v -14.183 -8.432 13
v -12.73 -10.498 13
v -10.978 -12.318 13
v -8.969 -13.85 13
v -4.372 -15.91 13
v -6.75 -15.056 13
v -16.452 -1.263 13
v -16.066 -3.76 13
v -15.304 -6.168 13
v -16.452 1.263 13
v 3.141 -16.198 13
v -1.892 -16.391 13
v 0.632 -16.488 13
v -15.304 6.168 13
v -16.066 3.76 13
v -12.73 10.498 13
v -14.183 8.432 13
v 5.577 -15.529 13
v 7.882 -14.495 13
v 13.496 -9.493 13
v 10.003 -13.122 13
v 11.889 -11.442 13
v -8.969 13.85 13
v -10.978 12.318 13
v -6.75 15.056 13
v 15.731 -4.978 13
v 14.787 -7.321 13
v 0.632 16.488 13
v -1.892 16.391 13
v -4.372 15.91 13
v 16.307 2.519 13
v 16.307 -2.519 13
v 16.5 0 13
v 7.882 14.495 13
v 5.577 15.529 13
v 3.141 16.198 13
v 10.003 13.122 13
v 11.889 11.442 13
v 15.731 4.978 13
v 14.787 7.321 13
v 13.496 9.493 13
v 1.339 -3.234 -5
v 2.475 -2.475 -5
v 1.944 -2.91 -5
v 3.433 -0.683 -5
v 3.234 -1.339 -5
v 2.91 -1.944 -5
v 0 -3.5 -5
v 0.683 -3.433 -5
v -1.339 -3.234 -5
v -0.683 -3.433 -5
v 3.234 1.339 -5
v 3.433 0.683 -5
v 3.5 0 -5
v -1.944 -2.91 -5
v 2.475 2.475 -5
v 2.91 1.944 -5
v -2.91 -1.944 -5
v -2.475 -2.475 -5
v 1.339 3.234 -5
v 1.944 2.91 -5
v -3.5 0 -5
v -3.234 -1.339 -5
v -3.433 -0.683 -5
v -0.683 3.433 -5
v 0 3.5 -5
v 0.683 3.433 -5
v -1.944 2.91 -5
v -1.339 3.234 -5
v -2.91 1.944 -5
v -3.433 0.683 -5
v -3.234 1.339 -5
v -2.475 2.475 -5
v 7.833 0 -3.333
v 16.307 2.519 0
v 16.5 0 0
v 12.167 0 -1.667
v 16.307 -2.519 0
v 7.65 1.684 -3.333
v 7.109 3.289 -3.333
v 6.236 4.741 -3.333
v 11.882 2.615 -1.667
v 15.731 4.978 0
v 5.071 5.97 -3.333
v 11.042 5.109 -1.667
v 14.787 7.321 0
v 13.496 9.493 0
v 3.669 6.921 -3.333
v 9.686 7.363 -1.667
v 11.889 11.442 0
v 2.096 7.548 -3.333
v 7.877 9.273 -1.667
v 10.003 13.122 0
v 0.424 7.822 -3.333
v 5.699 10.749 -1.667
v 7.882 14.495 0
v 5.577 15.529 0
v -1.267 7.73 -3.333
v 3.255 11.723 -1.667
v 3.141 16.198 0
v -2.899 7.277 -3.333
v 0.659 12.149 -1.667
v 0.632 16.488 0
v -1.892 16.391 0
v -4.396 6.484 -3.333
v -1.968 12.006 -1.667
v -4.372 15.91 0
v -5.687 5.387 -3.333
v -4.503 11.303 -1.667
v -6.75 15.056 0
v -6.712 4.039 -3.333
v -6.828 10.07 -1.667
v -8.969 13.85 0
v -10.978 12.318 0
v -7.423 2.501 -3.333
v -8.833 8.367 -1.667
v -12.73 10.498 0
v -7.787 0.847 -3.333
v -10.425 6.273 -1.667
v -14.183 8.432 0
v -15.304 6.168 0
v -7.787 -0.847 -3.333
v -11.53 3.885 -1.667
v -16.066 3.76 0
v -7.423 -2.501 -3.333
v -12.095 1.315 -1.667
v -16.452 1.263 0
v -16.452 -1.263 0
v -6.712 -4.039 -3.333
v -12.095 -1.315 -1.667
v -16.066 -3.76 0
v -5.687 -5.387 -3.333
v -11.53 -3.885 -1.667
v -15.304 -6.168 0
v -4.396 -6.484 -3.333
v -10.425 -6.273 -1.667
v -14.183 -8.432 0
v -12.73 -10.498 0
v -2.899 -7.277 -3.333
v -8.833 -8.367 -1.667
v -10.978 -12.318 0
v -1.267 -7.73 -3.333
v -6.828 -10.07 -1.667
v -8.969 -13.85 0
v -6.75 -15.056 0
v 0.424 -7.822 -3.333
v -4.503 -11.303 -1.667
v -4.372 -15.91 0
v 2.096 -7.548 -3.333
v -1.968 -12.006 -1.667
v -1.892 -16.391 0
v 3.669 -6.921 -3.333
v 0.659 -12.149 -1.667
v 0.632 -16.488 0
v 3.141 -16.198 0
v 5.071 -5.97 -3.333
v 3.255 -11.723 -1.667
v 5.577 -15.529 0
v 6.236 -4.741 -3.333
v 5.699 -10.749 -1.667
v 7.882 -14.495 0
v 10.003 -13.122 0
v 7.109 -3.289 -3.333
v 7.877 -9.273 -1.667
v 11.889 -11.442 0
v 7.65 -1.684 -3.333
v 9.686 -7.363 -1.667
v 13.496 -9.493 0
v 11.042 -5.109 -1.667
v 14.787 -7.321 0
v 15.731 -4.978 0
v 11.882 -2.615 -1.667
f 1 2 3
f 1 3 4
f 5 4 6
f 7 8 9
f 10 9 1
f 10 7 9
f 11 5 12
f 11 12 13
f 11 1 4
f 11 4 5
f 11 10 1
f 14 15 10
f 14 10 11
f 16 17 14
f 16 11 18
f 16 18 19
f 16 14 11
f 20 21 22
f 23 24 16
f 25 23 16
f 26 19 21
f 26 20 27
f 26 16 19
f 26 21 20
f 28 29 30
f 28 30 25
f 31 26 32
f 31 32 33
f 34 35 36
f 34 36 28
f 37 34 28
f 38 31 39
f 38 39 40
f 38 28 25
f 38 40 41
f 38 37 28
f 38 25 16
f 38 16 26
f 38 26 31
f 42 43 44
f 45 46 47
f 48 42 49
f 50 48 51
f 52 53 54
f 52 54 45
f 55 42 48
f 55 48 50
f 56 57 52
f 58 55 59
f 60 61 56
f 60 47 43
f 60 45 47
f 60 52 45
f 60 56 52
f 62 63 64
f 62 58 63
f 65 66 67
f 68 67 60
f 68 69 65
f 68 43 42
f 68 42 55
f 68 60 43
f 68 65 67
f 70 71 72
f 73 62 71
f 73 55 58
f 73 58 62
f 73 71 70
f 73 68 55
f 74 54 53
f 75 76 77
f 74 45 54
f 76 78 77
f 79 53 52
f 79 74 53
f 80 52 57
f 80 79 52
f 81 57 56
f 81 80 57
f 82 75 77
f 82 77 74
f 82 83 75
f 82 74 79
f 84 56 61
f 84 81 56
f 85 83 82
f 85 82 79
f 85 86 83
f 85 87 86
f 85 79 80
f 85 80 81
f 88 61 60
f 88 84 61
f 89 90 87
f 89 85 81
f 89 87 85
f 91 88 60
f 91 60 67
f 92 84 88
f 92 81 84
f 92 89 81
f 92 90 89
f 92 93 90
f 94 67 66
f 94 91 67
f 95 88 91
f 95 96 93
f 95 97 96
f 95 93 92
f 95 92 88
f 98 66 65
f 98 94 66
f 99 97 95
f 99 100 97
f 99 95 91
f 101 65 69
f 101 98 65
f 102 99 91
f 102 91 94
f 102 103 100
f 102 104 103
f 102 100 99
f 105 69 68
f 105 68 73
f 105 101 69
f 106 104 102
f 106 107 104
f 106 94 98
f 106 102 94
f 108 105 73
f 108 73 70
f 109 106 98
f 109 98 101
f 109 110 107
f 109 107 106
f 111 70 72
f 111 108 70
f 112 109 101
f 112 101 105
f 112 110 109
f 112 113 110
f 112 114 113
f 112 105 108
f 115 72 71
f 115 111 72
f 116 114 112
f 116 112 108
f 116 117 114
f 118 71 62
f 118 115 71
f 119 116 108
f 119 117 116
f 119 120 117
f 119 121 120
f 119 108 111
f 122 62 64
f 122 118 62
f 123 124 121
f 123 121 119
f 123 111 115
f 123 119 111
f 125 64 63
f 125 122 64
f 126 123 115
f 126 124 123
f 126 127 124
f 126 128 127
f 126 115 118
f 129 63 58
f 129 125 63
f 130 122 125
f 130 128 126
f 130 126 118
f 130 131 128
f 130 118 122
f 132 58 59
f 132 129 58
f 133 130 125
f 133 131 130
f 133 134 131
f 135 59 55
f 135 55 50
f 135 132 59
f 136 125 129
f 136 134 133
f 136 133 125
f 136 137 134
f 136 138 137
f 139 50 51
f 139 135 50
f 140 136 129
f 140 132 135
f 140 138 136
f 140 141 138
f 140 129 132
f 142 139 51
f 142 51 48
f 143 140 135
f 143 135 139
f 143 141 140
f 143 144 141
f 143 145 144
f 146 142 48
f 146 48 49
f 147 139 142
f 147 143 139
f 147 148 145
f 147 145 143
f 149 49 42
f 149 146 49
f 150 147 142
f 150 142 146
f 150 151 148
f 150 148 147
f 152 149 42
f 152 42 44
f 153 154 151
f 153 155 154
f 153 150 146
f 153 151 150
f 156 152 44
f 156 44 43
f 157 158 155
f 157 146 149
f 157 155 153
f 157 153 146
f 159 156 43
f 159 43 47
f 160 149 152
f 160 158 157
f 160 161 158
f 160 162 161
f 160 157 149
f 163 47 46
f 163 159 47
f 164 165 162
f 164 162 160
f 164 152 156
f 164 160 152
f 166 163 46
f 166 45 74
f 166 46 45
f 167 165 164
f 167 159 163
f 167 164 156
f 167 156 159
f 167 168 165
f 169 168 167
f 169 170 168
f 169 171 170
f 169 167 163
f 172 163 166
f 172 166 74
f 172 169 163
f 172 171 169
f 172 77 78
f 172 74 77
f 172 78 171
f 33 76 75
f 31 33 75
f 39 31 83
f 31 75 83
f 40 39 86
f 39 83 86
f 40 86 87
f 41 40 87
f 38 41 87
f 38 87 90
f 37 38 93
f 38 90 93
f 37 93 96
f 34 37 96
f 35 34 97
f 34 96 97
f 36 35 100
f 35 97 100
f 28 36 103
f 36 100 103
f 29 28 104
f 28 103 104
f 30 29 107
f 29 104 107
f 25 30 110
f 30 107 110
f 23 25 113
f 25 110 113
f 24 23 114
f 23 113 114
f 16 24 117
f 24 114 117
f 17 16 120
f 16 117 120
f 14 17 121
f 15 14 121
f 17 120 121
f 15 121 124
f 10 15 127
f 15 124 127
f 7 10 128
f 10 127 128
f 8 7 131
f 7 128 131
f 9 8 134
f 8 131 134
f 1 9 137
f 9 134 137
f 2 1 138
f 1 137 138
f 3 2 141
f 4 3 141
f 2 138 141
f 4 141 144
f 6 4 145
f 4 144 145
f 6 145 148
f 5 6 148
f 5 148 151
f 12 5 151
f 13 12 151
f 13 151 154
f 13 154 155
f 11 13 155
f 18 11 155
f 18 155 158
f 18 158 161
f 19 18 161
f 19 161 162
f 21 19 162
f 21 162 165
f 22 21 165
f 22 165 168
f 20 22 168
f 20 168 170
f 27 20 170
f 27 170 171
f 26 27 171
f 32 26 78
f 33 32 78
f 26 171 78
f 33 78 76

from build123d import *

# Parameters (mm, degrees)
CYLINDER_R     = 16.5
CYLINDER_DEPTH = 13


with BuildPart() as cilindro:
    # Cylinder → Cylinder (new body)
    with BuildSketch(Plane.XY):
        Circle(CYLINDER_R)
    extrude(amount=CYLINDER_DEPTH)


with BuildPart() as fusion:
    # Cone → Cone (revolve)
    with BuildSketch(Plane(origin=(0, 0, -5), x_dir=(1, 0, 0), z_dir=(0, -1, 0))):
        Polygon((0, 0), (3.5, 0), (16.5, 5), (0, 5), align=None)
    revolve(axis=Axis((0, 0, -5), (0, 0, 1)))

    # Fusion: union Cilindro
    add(cilindro.part)


solid = fusion.part
